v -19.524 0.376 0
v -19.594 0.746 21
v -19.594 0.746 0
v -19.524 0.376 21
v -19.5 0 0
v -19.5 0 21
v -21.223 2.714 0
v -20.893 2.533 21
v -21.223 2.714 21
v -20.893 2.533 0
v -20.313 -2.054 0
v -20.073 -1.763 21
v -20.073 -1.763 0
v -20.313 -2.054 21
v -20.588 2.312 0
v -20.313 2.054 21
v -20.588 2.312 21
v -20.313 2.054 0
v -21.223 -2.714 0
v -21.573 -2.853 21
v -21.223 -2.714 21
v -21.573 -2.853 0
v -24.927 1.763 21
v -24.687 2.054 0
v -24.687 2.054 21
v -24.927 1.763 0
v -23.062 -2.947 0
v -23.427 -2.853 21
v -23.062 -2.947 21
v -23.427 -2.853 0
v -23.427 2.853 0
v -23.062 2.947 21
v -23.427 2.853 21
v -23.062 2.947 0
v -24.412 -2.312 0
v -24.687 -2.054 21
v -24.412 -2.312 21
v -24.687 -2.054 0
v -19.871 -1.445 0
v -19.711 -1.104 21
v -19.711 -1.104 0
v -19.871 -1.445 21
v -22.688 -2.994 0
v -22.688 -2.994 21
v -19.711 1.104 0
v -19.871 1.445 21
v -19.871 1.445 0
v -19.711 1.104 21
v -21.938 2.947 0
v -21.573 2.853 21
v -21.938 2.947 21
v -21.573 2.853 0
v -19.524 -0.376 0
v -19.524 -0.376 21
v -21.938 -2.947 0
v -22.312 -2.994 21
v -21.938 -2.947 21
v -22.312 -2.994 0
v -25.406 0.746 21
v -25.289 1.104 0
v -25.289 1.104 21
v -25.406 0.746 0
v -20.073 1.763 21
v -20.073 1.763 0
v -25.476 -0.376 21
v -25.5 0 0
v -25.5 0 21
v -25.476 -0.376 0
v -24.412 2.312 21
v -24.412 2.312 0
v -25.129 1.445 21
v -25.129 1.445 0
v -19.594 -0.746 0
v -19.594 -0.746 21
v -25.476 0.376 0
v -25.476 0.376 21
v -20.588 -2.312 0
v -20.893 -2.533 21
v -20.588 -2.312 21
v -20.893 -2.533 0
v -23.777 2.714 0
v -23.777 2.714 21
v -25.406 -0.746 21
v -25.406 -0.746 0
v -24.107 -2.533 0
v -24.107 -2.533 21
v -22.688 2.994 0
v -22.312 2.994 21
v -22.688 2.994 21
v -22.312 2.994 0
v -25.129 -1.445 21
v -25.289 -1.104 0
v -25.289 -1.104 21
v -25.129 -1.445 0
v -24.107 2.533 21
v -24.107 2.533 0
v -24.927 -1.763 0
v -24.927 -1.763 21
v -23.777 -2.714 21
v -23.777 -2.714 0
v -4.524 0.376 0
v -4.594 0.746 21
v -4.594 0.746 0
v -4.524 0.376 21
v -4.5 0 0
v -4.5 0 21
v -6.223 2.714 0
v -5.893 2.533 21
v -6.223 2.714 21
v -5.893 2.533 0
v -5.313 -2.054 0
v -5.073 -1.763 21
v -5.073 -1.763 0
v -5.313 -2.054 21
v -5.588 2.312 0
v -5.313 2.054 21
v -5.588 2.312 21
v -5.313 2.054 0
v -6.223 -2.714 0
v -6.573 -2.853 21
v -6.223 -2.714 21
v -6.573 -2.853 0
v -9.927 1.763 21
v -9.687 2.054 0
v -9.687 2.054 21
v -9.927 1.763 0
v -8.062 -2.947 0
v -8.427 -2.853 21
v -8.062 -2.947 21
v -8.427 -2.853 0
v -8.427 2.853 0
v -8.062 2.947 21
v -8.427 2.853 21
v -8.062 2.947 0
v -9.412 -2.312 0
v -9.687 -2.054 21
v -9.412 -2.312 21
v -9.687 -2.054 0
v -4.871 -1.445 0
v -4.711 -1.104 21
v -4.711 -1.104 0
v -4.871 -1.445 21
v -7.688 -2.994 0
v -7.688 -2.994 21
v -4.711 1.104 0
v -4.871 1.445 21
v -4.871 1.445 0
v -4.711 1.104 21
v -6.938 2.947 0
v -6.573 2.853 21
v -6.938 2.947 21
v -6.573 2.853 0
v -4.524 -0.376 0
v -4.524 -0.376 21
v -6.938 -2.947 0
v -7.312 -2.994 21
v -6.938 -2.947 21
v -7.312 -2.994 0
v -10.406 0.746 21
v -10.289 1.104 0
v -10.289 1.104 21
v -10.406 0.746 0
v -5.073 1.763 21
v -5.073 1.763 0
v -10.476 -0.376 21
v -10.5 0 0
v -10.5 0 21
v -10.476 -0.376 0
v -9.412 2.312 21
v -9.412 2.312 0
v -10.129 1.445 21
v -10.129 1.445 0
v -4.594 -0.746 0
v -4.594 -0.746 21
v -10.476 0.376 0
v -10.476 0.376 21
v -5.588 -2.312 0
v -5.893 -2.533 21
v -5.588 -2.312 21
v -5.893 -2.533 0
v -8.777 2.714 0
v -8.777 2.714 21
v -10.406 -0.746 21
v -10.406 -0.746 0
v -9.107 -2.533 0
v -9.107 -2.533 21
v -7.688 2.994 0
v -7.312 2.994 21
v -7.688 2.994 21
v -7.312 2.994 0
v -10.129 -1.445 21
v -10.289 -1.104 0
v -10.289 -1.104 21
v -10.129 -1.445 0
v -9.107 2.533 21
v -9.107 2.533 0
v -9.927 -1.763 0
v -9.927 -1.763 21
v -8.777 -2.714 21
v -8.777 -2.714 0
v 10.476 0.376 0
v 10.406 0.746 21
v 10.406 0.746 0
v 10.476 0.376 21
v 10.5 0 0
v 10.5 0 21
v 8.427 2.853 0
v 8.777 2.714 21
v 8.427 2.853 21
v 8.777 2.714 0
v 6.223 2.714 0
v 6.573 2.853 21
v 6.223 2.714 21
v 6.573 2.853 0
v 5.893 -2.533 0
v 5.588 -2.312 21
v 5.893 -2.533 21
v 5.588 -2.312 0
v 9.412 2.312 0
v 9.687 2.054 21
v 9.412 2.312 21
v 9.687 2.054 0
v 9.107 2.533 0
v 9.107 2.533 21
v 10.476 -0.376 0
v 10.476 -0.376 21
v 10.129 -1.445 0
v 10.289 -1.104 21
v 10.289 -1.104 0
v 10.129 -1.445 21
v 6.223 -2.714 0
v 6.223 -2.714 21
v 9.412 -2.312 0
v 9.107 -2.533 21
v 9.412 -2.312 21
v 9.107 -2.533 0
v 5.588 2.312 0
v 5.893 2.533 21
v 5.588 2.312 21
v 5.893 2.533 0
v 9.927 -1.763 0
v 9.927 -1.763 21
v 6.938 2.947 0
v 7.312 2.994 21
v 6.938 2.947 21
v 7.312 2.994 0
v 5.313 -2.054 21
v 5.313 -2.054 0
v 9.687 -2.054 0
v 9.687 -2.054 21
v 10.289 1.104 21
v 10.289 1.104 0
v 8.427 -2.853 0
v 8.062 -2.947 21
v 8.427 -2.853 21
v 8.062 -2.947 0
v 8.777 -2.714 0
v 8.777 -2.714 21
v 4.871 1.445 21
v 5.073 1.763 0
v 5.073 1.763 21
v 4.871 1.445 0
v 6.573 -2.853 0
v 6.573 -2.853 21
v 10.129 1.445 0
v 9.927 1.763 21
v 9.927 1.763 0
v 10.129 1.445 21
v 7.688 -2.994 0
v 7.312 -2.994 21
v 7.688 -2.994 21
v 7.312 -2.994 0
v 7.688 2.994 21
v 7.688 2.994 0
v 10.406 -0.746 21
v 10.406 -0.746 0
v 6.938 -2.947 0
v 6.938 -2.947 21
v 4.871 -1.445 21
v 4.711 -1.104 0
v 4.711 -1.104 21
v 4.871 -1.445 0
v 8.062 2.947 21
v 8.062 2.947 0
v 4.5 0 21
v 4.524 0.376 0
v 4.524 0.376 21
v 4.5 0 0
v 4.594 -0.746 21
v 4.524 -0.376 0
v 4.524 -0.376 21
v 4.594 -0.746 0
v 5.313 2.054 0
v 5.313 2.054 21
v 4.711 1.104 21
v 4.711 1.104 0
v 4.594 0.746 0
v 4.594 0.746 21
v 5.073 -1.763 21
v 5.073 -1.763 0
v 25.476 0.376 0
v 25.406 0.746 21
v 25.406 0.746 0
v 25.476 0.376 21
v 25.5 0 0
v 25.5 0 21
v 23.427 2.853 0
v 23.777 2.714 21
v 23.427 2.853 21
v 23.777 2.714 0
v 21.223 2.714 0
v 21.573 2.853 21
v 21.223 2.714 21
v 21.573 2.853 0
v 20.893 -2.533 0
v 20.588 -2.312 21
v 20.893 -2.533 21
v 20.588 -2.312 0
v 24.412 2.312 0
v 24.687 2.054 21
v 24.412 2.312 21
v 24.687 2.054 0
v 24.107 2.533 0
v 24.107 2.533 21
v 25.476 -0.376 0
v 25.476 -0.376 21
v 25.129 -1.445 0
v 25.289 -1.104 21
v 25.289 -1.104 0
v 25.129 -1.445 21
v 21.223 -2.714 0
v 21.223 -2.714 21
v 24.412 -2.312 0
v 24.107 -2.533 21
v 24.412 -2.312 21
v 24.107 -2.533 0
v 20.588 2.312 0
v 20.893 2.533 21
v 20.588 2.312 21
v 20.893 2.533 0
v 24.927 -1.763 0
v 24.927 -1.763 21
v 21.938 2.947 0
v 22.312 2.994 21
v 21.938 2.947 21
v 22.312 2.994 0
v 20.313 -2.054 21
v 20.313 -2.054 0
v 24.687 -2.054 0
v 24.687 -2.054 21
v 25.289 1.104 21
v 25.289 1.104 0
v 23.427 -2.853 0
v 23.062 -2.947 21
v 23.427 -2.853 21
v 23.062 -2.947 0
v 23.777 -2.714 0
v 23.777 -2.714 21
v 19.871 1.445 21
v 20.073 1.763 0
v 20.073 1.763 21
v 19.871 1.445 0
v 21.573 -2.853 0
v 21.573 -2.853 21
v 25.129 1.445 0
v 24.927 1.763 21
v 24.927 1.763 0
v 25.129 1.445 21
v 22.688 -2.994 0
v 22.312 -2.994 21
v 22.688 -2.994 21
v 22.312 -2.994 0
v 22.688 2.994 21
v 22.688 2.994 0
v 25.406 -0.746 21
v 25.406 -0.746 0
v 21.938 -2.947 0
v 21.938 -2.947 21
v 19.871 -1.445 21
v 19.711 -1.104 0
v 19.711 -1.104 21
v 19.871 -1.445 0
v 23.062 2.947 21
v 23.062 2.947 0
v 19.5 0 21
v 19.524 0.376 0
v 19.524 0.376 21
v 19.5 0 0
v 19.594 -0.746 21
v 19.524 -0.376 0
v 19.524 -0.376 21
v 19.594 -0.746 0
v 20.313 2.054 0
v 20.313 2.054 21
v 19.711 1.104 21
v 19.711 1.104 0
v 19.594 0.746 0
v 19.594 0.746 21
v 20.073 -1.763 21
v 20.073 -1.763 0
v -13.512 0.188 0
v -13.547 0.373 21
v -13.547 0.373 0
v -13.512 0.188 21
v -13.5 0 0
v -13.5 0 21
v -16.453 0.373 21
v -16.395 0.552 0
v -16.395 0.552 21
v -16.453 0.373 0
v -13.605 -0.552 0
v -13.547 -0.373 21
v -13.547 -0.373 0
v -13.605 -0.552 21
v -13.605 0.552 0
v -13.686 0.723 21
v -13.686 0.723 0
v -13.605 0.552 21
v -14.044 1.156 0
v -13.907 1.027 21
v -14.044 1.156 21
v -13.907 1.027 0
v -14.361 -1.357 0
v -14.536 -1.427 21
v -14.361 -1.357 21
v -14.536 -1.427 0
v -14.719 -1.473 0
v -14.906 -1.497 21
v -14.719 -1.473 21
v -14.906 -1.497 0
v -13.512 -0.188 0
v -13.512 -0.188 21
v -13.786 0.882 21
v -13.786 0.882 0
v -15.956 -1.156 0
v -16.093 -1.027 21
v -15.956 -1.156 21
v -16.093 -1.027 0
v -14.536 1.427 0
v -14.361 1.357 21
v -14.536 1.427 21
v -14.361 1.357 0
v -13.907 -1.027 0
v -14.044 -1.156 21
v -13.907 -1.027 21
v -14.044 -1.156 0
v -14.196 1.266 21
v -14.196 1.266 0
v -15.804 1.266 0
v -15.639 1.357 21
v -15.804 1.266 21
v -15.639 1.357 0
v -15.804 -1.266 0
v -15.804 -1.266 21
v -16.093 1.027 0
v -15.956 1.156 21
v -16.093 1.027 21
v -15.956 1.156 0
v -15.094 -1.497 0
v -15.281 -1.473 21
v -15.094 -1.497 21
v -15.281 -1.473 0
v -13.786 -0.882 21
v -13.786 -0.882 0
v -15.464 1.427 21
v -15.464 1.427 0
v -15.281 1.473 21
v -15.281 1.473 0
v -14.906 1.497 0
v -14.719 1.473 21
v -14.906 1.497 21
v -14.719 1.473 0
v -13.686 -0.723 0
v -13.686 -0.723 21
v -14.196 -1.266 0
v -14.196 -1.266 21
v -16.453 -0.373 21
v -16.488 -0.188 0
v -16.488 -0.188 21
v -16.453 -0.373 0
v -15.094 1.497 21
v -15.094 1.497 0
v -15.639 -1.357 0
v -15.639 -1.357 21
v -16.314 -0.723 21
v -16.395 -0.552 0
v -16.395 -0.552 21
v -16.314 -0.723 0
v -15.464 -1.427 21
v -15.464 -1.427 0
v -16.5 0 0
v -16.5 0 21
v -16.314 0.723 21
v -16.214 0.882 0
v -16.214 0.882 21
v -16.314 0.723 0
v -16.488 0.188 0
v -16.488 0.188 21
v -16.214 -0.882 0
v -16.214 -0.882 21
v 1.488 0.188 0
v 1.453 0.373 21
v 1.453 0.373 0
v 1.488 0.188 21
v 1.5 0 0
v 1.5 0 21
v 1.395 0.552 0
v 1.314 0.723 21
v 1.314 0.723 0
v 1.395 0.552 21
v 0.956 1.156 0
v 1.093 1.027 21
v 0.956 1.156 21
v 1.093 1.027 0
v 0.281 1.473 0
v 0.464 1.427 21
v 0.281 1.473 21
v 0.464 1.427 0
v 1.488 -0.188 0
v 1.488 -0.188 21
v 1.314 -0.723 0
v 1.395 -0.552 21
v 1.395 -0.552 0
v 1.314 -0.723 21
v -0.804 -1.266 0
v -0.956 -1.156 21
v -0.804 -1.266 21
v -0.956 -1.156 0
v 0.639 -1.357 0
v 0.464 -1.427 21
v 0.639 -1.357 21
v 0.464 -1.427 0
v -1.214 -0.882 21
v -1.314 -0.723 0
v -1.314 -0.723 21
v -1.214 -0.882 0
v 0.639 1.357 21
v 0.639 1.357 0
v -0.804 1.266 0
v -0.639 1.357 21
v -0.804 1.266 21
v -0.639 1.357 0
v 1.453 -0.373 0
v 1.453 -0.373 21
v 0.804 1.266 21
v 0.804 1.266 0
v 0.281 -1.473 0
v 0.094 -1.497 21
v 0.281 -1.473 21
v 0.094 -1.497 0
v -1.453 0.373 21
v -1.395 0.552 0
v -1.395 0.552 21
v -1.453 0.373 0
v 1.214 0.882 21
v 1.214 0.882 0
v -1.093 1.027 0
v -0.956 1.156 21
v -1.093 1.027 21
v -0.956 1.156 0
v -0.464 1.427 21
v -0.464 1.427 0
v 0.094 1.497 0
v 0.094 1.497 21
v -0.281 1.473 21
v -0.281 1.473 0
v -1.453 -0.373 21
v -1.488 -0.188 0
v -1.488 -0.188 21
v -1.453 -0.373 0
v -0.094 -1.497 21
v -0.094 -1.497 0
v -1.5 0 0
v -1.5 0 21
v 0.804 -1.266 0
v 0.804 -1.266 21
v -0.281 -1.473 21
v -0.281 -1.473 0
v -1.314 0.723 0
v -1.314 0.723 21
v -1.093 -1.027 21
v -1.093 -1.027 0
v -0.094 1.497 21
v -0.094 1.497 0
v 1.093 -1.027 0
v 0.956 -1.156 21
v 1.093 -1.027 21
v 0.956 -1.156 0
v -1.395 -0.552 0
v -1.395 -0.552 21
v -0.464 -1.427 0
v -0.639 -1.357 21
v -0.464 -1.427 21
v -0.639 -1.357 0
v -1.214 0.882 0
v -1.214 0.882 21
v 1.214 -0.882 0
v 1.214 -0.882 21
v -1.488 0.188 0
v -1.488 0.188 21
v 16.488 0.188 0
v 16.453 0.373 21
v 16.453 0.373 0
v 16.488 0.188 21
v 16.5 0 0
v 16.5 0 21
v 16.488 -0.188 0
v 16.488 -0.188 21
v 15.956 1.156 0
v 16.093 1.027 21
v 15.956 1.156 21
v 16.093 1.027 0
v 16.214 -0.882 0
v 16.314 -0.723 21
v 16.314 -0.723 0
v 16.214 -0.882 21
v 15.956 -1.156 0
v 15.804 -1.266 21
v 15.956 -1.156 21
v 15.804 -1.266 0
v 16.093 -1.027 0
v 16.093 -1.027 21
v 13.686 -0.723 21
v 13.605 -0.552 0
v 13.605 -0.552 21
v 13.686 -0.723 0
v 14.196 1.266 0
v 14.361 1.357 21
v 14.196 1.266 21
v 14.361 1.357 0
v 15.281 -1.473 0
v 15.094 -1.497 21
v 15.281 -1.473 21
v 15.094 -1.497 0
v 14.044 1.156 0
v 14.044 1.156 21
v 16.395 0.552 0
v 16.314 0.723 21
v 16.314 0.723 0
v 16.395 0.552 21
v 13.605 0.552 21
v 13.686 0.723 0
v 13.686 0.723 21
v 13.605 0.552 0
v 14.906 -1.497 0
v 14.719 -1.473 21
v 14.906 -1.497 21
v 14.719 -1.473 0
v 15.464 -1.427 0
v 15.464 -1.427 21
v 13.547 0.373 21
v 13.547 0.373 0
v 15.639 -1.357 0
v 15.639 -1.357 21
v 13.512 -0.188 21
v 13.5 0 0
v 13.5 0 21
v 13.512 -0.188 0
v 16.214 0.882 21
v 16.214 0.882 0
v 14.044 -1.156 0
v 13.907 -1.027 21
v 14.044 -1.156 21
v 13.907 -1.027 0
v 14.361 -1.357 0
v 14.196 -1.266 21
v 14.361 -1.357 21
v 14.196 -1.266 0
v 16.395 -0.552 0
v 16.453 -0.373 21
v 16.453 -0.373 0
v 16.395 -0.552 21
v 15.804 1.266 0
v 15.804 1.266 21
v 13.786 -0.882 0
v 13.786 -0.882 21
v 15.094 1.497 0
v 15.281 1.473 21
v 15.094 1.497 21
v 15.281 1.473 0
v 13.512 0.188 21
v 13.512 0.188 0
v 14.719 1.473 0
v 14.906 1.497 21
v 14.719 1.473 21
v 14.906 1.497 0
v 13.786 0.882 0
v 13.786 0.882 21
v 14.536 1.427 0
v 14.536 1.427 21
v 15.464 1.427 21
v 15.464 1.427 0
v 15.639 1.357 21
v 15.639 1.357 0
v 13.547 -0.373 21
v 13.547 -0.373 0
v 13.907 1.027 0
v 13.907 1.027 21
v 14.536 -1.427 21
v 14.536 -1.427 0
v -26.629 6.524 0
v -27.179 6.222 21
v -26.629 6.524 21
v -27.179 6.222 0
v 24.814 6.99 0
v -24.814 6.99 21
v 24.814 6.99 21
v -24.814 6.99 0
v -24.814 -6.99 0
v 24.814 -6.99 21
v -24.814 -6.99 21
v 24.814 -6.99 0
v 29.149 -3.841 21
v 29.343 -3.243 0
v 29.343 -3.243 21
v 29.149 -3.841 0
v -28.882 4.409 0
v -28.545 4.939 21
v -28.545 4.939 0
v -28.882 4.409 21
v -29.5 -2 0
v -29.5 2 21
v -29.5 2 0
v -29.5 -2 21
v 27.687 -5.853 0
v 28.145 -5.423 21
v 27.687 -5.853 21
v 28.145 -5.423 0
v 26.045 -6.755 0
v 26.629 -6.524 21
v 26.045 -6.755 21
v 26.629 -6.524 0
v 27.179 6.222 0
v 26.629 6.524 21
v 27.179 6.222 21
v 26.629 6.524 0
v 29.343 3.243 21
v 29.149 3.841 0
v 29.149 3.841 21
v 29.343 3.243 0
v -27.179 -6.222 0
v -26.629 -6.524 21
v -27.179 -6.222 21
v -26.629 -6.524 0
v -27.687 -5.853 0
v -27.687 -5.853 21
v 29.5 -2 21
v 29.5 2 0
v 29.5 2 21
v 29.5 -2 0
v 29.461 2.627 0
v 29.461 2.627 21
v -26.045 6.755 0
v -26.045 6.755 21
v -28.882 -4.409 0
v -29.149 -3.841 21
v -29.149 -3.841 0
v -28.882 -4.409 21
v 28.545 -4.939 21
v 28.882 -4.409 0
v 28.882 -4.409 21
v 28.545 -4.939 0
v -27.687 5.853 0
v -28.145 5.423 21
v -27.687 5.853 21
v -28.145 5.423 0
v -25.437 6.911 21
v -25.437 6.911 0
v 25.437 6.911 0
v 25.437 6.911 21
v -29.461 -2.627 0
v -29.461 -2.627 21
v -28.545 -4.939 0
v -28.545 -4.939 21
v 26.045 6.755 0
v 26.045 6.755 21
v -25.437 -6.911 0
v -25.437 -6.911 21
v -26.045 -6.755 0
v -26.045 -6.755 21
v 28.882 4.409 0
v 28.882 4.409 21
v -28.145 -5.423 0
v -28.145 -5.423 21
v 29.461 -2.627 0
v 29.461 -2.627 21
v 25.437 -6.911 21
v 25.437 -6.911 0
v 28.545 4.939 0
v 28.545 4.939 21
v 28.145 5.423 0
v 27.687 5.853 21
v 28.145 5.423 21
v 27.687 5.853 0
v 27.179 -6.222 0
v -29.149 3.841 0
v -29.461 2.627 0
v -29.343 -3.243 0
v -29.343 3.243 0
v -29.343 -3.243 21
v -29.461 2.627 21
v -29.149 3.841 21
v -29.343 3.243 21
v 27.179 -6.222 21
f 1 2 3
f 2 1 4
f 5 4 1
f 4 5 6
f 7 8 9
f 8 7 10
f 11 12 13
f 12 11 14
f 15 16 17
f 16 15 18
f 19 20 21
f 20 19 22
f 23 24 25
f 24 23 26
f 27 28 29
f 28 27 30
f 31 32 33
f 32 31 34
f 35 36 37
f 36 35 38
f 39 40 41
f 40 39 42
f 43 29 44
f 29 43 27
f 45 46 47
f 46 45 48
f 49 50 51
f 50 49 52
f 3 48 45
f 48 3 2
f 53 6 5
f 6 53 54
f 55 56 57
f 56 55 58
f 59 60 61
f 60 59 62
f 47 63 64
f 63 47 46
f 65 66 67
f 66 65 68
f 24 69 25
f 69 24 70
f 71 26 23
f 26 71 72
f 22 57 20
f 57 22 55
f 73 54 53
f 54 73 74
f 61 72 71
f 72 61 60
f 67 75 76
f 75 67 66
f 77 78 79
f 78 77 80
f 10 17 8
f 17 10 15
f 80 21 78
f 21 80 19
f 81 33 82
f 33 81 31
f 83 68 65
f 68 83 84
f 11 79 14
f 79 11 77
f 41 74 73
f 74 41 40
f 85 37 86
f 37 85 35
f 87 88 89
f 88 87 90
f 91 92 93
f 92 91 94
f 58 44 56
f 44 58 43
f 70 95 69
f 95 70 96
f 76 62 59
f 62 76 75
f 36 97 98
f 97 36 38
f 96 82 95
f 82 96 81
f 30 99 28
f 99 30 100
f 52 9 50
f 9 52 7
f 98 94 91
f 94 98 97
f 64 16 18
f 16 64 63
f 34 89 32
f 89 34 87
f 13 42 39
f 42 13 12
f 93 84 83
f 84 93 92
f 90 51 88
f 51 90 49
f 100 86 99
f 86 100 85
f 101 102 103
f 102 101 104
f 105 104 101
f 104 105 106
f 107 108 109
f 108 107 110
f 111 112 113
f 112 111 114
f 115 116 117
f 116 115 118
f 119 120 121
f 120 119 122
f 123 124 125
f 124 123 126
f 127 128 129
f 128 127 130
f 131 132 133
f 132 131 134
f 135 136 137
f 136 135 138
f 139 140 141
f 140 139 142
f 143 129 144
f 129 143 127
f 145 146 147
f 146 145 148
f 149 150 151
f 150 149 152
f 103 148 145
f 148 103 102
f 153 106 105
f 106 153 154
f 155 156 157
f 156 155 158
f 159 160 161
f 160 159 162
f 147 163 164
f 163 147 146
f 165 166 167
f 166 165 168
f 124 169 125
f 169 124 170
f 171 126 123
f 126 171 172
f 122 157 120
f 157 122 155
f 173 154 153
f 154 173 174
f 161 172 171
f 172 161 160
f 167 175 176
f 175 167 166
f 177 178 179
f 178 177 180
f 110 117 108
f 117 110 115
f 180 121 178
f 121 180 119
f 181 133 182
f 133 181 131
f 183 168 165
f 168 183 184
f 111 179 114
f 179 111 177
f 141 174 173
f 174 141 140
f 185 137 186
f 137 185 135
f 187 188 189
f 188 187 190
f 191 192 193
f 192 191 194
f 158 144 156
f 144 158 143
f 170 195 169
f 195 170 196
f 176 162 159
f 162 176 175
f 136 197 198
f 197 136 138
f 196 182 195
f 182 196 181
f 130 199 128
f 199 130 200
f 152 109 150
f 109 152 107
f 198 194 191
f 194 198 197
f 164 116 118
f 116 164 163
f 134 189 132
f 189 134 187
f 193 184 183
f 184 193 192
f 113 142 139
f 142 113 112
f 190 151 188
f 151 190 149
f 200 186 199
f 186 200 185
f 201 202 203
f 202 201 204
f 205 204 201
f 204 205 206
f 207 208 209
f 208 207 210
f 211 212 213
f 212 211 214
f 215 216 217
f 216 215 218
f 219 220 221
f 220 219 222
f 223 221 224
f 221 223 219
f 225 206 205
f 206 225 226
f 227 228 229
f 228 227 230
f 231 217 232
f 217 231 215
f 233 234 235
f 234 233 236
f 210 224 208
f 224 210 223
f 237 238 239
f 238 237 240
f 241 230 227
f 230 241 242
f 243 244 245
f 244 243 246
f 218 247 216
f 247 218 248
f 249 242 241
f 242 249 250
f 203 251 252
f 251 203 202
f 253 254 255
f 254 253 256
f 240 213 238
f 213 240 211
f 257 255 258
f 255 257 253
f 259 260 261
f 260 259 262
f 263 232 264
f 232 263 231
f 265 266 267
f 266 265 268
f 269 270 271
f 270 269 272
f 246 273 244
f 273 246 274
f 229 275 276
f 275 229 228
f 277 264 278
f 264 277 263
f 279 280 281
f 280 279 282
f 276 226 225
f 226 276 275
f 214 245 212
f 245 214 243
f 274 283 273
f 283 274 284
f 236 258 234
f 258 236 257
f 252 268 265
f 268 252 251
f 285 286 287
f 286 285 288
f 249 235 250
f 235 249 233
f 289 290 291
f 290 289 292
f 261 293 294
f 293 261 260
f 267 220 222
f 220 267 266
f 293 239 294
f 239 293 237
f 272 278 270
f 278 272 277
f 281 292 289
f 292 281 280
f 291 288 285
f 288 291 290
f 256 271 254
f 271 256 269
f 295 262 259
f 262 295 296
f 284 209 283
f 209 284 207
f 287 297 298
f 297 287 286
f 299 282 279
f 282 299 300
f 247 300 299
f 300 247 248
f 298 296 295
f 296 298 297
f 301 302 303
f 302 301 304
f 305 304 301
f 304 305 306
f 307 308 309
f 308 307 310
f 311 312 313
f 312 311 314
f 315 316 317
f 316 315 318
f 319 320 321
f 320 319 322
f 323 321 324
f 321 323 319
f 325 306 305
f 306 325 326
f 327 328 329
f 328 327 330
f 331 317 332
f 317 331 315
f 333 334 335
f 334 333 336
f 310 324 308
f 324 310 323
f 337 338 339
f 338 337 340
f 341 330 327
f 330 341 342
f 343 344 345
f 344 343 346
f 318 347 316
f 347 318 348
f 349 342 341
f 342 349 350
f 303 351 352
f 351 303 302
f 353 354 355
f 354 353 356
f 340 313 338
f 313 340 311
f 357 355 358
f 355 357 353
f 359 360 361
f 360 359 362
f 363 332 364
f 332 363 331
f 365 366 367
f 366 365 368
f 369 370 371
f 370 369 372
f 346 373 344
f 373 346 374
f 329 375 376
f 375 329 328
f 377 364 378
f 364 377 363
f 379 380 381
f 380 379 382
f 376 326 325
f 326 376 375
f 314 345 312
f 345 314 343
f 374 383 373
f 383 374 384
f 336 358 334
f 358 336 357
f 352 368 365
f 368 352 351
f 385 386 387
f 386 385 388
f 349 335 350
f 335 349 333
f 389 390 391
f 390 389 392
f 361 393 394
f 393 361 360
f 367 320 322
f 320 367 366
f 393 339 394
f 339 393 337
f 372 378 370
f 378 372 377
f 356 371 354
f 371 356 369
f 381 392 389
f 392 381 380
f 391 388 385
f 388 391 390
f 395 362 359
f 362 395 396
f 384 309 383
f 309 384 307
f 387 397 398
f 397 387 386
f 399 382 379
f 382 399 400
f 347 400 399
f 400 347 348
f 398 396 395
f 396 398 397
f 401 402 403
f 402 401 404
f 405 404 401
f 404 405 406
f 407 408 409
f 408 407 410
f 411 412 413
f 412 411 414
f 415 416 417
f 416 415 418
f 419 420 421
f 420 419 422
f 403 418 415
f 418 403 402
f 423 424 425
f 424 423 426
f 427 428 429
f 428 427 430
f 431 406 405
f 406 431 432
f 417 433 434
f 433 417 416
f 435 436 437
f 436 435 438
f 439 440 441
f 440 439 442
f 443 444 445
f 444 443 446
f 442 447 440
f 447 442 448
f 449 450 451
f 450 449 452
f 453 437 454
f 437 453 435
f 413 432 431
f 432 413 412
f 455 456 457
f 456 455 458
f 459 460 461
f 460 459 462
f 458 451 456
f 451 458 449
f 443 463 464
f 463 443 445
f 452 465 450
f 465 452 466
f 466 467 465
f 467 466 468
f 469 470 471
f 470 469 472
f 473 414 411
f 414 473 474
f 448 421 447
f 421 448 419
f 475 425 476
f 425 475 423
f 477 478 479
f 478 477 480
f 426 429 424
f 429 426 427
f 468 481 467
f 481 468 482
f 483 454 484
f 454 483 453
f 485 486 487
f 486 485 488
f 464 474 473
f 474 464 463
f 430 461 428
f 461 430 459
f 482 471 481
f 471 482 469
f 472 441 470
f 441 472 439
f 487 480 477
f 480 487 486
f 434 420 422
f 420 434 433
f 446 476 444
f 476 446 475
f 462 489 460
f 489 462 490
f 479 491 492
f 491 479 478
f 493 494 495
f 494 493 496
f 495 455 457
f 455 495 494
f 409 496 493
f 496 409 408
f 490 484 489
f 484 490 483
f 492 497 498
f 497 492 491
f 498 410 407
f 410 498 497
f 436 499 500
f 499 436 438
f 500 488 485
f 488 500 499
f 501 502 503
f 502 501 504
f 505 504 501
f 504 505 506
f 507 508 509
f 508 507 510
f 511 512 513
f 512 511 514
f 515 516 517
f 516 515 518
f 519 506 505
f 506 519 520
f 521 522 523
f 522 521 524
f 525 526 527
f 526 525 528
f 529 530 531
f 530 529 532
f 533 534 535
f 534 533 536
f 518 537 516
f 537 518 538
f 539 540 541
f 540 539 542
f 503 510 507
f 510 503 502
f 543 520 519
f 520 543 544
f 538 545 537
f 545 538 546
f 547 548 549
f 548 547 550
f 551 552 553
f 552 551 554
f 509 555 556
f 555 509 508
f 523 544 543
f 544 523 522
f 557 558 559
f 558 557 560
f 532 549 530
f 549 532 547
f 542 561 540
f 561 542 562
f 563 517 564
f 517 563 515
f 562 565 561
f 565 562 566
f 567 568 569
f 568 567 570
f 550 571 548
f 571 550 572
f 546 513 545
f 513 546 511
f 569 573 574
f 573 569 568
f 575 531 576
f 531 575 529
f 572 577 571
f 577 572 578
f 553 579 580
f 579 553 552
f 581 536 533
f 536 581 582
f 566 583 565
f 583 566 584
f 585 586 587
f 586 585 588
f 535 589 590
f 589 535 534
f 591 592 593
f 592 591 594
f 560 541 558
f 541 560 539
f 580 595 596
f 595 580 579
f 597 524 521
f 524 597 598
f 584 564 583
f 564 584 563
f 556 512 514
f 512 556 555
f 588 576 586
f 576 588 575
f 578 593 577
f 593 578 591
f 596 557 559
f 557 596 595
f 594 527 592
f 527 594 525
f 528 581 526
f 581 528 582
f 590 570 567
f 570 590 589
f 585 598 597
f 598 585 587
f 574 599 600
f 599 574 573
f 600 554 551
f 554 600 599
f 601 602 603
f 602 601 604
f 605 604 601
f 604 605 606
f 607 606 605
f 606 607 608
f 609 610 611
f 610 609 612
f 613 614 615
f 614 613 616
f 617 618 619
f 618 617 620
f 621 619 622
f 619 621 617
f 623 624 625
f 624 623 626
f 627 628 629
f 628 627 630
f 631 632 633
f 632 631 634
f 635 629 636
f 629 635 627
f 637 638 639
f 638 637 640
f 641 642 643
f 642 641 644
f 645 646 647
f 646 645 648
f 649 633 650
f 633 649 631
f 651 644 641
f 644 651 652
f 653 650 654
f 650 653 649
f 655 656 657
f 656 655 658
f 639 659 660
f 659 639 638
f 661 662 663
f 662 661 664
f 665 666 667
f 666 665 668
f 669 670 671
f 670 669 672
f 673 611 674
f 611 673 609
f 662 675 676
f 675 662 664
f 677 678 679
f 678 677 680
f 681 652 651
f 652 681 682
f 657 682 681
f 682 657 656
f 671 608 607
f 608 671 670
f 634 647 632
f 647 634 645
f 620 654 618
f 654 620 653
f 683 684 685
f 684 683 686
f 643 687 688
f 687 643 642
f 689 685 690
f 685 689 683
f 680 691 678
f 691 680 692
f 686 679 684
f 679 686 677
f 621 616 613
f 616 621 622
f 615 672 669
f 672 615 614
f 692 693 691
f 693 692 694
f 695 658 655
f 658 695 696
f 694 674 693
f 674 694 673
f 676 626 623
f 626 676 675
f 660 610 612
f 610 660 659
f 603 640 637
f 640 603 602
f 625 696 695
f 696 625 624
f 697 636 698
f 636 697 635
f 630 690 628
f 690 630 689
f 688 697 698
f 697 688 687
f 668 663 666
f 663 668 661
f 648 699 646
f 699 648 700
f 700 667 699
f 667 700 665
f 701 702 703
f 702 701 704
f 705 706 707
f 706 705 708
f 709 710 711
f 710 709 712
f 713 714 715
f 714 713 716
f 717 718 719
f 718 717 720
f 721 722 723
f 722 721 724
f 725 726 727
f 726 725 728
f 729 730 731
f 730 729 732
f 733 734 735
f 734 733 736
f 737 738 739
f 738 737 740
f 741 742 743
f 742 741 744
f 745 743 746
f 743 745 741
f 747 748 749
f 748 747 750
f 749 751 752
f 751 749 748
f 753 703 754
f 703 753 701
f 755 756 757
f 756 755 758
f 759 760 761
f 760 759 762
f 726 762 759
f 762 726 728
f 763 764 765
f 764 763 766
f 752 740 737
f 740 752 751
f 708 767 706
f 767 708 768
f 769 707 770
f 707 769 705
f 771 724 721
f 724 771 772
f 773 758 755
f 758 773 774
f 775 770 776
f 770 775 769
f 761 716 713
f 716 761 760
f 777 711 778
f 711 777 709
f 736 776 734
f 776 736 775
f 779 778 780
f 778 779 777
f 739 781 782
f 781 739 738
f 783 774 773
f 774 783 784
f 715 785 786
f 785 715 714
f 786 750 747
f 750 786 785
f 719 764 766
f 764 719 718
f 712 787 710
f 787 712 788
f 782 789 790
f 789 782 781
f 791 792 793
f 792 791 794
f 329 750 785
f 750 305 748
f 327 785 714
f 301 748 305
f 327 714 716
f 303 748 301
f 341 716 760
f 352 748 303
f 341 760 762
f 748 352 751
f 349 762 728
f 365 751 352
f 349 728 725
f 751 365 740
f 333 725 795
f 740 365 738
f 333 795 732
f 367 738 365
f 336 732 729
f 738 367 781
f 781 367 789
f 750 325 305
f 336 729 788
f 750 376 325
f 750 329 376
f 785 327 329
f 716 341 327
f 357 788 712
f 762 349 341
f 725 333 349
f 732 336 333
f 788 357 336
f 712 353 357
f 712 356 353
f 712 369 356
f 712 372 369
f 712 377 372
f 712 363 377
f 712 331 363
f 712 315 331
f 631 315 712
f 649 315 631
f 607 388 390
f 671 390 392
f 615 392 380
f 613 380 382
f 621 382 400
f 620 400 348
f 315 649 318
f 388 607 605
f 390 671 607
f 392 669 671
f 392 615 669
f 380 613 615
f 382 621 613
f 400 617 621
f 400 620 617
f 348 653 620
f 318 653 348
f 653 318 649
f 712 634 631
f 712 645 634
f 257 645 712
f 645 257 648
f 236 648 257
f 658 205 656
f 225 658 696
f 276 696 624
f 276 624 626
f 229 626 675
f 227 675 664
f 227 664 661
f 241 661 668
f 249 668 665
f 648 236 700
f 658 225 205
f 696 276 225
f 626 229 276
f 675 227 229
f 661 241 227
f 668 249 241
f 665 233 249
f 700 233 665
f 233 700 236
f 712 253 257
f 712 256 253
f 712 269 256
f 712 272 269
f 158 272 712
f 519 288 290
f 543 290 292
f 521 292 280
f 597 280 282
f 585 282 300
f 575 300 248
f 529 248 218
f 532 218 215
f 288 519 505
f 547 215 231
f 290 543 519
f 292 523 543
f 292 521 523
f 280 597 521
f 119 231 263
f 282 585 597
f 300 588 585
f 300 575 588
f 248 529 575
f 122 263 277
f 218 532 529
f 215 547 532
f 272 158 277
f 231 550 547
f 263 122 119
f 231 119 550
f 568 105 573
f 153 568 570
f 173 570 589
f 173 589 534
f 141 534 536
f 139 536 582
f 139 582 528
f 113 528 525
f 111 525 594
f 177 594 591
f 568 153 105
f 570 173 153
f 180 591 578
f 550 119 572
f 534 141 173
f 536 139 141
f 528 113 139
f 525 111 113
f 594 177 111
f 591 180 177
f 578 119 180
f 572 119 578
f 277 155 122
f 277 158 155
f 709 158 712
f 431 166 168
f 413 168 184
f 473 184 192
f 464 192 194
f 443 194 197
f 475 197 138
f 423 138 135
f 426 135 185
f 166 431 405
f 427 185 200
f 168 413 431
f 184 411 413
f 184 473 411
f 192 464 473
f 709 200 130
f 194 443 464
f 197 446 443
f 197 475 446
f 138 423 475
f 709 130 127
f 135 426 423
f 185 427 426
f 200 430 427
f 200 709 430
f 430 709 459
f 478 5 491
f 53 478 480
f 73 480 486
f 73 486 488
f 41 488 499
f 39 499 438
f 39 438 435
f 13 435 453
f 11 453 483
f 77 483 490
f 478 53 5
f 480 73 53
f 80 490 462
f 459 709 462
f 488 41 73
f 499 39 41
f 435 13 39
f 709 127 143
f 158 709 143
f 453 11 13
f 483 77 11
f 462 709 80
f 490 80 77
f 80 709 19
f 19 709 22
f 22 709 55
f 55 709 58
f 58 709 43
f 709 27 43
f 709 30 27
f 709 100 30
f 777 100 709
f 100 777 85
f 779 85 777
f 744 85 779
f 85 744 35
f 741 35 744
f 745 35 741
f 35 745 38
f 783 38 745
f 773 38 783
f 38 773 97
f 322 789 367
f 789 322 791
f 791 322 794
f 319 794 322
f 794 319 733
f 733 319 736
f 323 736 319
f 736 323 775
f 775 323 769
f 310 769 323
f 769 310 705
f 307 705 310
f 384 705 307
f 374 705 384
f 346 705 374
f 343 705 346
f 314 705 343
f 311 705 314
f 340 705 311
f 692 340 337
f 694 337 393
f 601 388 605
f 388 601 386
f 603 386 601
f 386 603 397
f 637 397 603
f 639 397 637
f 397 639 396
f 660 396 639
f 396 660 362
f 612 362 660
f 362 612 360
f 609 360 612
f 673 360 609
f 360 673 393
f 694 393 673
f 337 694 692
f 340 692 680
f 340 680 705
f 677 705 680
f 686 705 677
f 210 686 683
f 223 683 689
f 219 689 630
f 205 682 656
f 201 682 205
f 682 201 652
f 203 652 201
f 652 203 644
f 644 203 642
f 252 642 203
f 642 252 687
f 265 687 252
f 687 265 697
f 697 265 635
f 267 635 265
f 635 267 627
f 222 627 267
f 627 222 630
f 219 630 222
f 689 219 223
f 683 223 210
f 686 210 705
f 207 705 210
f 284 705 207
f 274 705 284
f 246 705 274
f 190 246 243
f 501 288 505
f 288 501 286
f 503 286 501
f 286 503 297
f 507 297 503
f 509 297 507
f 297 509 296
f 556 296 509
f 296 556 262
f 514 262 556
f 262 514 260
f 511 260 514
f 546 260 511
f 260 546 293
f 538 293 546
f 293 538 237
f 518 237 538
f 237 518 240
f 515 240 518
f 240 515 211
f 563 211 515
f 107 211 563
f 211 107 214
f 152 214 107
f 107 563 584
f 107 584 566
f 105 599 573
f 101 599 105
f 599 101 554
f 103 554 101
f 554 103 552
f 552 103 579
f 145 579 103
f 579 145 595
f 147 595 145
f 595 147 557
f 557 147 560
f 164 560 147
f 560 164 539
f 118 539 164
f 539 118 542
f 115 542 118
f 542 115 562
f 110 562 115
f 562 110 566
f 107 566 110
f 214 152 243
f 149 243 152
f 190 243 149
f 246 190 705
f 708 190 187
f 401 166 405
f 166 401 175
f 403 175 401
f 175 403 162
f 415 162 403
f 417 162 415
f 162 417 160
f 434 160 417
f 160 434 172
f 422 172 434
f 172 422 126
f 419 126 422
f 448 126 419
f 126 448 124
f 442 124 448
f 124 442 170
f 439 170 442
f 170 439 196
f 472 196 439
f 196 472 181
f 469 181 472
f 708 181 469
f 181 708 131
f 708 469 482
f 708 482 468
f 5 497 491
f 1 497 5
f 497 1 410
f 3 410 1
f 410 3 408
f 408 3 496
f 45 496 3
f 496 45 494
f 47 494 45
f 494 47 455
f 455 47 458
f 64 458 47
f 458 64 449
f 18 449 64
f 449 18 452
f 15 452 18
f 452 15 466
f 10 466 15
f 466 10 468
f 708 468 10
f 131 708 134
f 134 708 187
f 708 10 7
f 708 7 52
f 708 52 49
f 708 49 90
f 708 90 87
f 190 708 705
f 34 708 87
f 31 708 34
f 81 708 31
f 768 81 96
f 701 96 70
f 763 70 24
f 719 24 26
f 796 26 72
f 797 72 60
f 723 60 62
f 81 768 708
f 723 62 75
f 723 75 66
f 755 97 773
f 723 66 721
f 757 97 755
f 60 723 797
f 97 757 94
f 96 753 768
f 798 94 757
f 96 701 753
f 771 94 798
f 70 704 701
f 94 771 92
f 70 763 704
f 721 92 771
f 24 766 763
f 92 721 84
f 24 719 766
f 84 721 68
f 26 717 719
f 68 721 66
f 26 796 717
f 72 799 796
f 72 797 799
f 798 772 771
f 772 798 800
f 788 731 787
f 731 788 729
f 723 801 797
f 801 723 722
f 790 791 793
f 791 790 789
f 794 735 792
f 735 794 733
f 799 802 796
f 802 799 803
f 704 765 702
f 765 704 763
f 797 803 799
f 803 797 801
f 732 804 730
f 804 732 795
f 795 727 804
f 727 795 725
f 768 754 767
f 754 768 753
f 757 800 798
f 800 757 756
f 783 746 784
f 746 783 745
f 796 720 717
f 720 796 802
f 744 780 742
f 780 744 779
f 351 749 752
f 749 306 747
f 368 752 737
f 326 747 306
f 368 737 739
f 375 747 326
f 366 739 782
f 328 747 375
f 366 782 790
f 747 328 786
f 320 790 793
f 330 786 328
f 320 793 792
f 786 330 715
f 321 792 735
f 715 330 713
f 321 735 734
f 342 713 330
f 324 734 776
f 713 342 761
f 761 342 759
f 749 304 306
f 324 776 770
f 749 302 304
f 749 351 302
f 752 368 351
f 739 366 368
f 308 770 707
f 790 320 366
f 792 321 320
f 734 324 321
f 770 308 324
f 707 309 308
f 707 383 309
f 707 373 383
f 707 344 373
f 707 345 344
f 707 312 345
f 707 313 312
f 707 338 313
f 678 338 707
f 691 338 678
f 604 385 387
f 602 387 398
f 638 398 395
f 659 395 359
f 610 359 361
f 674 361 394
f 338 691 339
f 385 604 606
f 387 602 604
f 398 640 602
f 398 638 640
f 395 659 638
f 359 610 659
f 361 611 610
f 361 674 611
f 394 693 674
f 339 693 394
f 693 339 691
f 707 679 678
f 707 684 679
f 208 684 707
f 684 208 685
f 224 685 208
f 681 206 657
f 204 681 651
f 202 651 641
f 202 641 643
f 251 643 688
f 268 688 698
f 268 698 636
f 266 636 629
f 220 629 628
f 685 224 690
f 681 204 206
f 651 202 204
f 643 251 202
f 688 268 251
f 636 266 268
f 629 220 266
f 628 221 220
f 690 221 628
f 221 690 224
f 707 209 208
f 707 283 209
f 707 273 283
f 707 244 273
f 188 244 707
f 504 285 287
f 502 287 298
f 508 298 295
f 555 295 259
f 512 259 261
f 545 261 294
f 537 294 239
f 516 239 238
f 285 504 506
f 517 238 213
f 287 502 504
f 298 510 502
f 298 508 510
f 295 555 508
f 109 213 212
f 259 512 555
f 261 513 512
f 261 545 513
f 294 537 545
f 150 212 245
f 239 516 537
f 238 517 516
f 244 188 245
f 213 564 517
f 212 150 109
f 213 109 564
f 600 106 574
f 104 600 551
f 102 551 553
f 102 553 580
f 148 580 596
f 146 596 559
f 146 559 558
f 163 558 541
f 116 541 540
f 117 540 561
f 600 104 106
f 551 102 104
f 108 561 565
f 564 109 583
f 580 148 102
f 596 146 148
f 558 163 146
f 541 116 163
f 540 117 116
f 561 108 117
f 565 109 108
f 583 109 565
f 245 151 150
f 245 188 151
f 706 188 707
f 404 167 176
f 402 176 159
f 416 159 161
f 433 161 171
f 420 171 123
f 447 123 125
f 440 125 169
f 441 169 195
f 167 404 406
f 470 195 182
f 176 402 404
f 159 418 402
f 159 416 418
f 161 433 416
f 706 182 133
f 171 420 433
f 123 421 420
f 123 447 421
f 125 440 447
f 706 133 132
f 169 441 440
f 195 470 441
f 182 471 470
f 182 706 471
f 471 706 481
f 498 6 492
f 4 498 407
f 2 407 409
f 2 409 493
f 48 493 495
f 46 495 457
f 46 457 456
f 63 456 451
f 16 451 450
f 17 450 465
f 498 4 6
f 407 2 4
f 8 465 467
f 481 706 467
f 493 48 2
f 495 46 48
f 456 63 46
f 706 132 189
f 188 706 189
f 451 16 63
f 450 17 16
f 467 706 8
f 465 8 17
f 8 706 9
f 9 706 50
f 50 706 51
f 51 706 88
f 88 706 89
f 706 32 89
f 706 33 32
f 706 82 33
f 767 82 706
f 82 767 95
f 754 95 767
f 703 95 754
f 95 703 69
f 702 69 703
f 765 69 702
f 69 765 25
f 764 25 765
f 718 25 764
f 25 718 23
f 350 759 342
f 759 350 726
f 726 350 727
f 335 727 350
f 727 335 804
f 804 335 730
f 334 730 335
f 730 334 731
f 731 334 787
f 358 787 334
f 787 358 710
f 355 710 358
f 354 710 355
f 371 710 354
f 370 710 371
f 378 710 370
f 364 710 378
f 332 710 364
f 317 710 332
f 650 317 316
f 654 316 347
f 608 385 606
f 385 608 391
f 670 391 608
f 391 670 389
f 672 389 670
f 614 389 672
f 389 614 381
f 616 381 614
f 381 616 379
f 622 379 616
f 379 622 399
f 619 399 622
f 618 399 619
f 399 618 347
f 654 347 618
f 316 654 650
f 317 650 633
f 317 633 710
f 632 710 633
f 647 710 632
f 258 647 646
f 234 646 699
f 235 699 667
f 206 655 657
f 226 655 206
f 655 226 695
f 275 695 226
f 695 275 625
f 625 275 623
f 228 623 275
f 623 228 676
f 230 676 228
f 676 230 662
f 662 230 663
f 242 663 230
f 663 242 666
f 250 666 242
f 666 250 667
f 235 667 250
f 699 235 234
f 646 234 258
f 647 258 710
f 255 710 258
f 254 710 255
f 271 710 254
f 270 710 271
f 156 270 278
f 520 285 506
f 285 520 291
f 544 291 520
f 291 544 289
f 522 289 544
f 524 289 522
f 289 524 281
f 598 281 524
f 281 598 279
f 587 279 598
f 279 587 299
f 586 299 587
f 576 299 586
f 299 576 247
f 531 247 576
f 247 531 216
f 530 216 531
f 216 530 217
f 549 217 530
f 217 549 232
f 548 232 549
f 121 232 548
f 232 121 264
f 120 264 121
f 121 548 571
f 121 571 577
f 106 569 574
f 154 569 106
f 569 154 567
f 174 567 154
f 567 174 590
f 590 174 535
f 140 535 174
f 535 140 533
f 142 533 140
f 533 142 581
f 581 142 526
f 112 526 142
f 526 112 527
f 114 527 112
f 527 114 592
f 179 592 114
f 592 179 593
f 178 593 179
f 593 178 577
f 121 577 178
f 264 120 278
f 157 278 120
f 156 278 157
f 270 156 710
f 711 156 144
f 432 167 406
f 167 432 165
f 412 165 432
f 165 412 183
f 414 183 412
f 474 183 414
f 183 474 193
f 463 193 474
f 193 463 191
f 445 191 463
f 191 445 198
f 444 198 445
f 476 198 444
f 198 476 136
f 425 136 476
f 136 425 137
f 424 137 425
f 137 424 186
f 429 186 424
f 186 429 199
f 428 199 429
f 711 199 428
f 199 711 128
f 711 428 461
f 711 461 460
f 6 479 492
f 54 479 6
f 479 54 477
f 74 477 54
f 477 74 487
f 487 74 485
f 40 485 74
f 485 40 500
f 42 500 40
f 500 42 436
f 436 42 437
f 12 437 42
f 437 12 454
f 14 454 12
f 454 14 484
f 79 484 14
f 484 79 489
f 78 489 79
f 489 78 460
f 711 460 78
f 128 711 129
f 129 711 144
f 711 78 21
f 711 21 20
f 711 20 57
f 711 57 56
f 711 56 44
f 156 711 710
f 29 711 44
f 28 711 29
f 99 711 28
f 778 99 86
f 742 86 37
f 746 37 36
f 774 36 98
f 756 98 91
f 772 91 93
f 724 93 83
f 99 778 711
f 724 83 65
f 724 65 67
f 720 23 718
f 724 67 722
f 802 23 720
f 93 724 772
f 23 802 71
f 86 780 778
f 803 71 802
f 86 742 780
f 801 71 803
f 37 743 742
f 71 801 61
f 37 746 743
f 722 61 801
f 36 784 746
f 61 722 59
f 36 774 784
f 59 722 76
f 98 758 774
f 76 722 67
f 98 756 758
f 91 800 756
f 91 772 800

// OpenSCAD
$fn = 50;


difference() {
	union() {
		*color(alpha = 1.0000000000, c = "gray") {
			translate(v = [0, 7, 0]) {
				linear_extrude(height = 1) {
					text(font = "Arial:style=Bold", halign = "center", size = 4.5000000000, text = "COMMENT plate main", valign = "center");
				}
			}
		}
		*color(alpha = 1.0000000000, c = "gray") {
			translate(v = [0, 14, 0]) {
				linear_extrude(height = 1) {
					text(font = "Arial:style=Bold", halign = "center", size = 4.5000000000, text = "COMMENT description oobb_plate_shape_p_type_21_depth_4_width_1_height_21_thickness_true_both_holes", valign = "center");
				}
			}
		}
		hull() {
			translate(v = [-24.5000000000, 2.0000000000, 0]) {
				cylinder(h = 21, r = 5);
			}
			translate(v = [24.5000000000, 2.0000000000, 0]) {
				cylinder(h = 21, r = 5);
			}
			translate(v = [-24.5000000000, -2.0000000000, 0]) {
				cylinder(h = 21, r = 5);
			}
			translate(v = [24.5000000000, -2.0000000000, 0]) {
				cylinder(h = 21, r = 5);
			}
		}
	}
	union() {
		*color(alpha = 1.0000000000, c = "gray") {
			translate(v = [0, 7, 0]) {
				linear_extrude(height = 1) {
					text(font = "Arial:style=Bold", halign = "center", size = 4.5000000000, text = "COMMENT holes main", valign = "center");
				}
			}
		}
		*color(alpha = 1.0000000000, c = "gray") {
			translate(v = [0, 14, 0]) {
				linear_extrude(height = 1) {
					text(font = "Arial:style=Bold", halign = "center", size = 4.5000000000, text = "COMMENT description oobb_holes_shape_n_type_4_width_1_height_21_thickness_true_both_holes", valign = "center");
				}
			}
		}
		translate(v = [-22.5000000000, 0.0000000000, 0]) {
			translate(v = [0, 0, -50]) {
				cylinder(h = 100, r = 3.0000000000);
			}
		}
		translate(v = [-7.5000000000, 0.0000000000, 0]) {
			translate(v = [0, 0, -50]) {
				cylinder(h = 100, r = 3.0000000000);
			}
		}
		translate(v = [7.5000000000, 0.0000000000, 0]) {
			translate(v = [0, 0, -50]) {
				cylinder(h = 100, r = 3.0000000000);
			}
		}
		translate(v = [22.5000000000, 0.0000000000, 0]) {
			translate(v = [0, 0, -50]) {
				cylinder(h = 100, r = 3.0000000000);
			}
		}
		translate(v = [-22.5000000000, 0.0000000000, 0]) {
			translate(v = [0, 0, -50]) {
				cylinder(h = 100, r = 1.5000000000);
			}
		}
		translate(v = [-15.0000000000, 0.0000000000, 0]) {
			translate(v = [0, 0, -50]) {
				cylinder(h = 100, r = 1.5000000000);
			}
		}
		translate(v = [-7.5000000000, 0.0000000000, 0]) {
			translate(v = [0, 0, -50]) {
				cylinder(h = 100, r = 1.5000000000);
			}
		}
		translate(v = [0, 0, -50]) {
			cylinder(h = 100, r = 1.5000000000);
		}
		translate(v = [7.5000000000, 0.0000000000, 0]) {
			translate(v = [0, 0, -50]) {
				cylinder(h = 100, r = 1.5000000000);
			}
		}
		translate(v = [15.0000000000, 0.0000000000, 0]) {
			translate(v = [0, 0, -50]) {
				cylinder(h = 100, r = 1.5000000000);
			}
		}
		translate(v = [22.5000000000, 0.0000000000, 0]) {
			translate(v = [0, 0, -50]) {
				cylinder(h = 100, r = 1.5000000000);
			}
		}
	}
}
